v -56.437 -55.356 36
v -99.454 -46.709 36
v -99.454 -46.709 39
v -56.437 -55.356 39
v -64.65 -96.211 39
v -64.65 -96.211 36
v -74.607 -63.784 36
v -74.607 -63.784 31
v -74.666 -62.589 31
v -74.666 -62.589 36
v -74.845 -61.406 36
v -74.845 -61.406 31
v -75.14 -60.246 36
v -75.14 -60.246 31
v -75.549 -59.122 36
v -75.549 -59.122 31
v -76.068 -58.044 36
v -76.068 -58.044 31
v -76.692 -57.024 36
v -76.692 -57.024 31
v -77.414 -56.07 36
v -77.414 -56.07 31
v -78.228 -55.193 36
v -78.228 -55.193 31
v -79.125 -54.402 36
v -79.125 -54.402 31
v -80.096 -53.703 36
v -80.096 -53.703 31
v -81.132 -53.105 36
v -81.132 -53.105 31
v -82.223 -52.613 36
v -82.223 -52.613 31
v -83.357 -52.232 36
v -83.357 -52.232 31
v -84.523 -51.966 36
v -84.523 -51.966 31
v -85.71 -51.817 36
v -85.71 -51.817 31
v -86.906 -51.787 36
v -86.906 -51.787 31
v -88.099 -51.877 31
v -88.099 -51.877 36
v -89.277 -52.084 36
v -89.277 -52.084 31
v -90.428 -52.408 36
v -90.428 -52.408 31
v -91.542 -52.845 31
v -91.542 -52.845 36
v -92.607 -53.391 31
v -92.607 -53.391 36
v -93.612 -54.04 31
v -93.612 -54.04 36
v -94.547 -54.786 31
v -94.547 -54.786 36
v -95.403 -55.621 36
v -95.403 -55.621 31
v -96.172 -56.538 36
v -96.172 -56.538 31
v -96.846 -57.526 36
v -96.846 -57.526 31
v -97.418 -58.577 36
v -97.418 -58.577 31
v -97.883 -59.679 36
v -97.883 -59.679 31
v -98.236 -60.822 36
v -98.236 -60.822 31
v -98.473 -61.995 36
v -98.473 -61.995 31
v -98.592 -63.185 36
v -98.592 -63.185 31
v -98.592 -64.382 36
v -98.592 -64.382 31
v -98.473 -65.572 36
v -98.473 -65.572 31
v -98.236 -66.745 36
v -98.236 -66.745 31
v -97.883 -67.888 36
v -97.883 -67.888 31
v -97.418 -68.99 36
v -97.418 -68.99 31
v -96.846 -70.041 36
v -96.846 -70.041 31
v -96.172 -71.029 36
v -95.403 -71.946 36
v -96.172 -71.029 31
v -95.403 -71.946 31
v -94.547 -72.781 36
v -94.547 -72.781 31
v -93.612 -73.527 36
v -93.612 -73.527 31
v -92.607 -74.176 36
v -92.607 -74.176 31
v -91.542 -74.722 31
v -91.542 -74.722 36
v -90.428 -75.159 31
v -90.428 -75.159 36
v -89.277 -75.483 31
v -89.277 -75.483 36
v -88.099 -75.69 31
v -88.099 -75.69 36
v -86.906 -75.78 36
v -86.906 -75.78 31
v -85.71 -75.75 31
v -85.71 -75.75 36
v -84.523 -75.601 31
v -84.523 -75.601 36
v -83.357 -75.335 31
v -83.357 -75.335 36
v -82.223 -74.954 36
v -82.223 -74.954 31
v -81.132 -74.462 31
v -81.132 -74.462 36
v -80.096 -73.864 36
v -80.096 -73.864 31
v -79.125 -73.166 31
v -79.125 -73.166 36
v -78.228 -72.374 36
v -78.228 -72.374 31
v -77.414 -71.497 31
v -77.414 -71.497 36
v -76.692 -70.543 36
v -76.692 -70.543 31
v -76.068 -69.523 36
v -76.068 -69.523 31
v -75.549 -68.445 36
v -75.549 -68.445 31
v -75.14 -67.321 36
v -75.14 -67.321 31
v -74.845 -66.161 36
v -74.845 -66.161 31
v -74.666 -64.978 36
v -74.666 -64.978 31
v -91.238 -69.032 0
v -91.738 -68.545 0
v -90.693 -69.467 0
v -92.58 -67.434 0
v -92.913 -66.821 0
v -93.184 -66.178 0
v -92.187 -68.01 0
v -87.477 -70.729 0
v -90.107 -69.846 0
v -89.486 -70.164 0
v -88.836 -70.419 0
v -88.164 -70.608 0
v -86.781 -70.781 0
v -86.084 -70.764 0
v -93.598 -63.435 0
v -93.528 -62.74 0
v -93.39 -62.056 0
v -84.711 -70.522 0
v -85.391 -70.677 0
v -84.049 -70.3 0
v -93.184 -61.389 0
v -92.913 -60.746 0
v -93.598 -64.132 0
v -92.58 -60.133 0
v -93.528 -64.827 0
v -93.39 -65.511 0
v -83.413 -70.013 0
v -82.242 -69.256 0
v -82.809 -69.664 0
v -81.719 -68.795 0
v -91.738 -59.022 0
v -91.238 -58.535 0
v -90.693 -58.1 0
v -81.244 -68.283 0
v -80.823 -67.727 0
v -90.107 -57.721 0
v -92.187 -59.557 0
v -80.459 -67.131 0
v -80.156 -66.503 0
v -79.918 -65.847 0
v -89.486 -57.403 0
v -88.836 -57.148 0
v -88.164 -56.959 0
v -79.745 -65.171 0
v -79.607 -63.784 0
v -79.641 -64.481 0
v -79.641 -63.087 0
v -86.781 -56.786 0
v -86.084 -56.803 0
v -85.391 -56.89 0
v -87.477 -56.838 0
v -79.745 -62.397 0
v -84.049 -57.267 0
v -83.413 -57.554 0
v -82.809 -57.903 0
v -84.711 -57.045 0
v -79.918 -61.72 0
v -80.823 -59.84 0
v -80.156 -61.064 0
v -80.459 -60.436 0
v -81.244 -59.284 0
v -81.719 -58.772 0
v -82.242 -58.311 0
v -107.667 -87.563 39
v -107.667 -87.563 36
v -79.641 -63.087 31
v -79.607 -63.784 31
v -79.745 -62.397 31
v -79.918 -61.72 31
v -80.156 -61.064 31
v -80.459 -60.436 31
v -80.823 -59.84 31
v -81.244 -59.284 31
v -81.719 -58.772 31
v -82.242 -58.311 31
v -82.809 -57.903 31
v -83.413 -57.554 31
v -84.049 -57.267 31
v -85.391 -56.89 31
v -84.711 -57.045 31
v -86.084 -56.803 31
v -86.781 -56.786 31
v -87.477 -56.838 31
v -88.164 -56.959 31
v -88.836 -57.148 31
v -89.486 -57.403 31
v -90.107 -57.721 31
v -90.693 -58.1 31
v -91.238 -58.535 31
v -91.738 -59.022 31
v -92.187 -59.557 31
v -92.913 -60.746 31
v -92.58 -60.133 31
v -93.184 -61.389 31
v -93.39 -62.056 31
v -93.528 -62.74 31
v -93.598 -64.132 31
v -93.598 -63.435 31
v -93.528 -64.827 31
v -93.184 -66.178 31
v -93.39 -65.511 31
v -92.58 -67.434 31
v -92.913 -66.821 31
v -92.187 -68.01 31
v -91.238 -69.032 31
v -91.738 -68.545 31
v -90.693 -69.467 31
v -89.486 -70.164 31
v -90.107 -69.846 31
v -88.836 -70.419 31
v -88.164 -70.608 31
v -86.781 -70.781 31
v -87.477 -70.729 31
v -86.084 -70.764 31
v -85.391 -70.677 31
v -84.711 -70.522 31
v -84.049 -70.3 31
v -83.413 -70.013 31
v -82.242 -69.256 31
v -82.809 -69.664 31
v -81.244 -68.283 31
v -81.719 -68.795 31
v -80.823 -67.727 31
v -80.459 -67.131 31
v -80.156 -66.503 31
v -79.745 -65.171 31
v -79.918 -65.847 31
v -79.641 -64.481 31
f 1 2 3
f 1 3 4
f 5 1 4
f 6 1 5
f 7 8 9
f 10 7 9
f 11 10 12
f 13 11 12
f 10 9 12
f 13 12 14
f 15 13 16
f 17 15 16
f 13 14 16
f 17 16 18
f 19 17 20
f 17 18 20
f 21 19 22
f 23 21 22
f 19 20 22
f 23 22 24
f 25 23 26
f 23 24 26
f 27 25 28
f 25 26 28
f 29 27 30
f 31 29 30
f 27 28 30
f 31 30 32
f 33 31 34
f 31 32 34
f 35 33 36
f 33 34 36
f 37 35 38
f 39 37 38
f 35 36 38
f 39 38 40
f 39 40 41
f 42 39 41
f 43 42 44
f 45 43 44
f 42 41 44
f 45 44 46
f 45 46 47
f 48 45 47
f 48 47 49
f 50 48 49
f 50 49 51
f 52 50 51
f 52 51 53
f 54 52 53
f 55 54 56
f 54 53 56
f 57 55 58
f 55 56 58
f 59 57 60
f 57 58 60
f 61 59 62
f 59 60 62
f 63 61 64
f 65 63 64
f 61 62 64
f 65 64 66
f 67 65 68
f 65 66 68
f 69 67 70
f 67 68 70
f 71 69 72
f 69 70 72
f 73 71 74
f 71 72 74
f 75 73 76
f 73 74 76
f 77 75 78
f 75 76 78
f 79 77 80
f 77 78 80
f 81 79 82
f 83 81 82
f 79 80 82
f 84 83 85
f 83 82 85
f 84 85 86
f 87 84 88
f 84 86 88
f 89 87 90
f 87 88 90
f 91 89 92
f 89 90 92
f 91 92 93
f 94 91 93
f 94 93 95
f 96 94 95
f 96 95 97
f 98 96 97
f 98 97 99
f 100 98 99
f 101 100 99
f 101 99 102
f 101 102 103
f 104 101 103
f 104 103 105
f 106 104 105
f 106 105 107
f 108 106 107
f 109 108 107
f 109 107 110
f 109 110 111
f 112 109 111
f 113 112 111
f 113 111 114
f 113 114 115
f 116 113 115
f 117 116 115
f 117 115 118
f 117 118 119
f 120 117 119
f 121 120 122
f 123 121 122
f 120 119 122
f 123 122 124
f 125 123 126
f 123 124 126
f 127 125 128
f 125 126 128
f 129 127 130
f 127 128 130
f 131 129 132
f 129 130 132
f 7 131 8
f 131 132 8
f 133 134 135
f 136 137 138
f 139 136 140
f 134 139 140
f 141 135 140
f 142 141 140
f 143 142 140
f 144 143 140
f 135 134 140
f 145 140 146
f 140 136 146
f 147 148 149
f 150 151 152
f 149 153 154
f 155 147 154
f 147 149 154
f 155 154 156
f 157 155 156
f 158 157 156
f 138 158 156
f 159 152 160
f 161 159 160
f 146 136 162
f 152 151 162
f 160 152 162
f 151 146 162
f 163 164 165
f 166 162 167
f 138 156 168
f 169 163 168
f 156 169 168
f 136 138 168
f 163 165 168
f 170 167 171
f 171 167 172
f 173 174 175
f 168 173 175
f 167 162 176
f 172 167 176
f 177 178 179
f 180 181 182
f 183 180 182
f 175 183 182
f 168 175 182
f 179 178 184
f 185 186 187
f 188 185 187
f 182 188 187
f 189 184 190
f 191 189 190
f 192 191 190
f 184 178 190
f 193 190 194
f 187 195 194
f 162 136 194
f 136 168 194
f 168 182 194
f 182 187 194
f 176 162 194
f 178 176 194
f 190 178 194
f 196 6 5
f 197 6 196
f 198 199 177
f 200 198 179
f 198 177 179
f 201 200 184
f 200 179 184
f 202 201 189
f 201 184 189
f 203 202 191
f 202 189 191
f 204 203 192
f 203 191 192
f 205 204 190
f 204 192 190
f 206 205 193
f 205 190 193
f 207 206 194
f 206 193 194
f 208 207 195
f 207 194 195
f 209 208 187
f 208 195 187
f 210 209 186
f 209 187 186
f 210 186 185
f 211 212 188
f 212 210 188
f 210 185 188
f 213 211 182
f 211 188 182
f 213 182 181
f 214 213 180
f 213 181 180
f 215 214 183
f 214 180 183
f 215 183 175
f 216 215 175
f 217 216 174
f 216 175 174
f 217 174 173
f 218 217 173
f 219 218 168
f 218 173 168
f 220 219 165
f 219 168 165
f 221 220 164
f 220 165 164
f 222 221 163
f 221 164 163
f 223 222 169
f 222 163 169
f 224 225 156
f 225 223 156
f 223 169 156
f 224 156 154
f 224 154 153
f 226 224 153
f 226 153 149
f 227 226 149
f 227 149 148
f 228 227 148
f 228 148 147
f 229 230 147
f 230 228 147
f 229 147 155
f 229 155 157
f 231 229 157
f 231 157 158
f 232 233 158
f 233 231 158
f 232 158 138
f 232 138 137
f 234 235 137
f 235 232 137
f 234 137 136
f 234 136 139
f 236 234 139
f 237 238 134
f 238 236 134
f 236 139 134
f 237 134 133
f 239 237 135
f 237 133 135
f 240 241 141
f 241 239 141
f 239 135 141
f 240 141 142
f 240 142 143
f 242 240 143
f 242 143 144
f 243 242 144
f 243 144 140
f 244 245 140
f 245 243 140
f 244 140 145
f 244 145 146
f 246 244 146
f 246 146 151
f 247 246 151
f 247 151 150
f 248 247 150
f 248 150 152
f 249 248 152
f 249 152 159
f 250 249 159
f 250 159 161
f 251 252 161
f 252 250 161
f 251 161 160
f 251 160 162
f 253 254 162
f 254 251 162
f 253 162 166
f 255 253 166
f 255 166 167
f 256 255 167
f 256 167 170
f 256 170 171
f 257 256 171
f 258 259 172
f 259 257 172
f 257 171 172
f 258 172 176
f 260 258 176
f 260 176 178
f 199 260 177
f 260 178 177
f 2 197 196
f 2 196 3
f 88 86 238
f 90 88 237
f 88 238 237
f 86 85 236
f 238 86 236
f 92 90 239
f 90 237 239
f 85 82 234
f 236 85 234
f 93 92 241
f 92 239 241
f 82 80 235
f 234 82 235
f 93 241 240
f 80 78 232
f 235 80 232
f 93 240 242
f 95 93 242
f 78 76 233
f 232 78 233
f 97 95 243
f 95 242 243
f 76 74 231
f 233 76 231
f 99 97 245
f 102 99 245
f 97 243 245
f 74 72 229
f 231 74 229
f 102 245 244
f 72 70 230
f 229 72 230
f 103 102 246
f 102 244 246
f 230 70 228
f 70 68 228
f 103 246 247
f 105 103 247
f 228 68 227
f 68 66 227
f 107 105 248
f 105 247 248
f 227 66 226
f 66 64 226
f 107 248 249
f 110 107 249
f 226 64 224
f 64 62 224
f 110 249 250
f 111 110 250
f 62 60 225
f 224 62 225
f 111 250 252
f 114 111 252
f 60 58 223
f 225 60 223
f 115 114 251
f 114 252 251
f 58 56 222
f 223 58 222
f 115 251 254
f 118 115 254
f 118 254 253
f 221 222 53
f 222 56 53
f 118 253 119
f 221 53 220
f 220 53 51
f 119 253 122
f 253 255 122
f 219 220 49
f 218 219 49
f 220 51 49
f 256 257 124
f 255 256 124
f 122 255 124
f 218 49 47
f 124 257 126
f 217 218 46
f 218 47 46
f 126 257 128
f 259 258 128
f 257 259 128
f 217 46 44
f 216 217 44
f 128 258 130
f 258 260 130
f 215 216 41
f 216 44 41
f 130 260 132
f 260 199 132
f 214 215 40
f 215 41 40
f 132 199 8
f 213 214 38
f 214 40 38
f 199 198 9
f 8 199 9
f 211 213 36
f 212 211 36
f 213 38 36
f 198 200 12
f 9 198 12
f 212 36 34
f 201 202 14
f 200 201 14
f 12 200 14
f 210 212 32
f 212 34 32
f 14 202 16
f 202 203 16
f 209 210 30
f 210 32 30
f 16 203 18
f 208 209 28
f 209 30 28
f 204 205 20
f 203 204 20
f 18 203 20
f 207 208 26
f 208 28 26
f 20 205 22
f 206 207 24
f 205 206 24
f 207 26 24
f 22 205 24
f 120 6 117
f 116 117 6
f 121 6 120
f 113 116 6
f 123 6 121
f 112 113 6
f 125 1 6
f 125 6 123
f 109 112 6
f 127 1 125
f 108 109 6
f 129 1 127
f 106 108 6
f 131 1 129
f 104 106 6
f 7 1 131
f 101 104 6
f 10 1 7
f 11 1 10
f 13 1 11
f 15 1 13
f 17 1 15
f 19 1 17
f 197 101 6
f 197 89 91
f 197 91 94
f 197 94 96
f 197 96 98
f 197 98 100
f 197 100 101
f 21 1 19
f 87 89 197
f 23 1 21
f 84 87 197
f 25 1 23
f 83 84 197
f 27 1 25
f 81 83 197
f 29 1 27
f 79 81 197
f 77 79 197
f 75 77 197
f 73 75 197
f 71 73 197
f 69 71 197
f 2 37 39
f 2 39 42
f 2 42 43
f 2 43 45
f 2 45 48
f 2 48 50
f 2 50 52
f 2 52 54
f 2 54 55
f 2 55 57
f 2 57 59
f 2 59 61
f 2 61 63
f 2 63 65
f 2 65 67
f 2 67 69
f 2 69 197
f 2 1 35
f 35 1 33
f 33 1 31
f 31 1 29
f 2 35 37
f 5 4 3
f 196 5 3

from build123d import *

# Parameters (mm, degrees)
SKETCH_1_R           = 7
EXTRUDE_1_DEPTH      = 34
EXTRUDE_2_DEPTH      = 2
EXTRUDE_2_DEPTH_BACK = 3
SKETCH_2_R           = 12
EXTRUDE_4_DEPTH      = 3


with BuildPart() as part:
    # 草图1 → 凸台-拉伸1 (new body)
    with BuildSketch(Plane.XY):
        with Locations((-86.606649797, -63.783530386)):
            Circle(SKETCH_1_R)
    extrude(amount=EXTRUDE_1_DEPTH)

    # 草图2 → 凸台-拉伸2 (add, two sides: drawn at the far end of the back side and taken through both)
    with BuildSketch(Plane.XY.offset(34).offset(-EXTRUDE_2_DEPTH_BACK)):
        with Locations((-86.606649797, -63.783530386)):
            Circle(SKETCH_2_R)
    extrude(amount=EXTRUDE_2_DEPTH + EXTRUDE_2_DEPTH_BACK)

    # 草图3 → 凸台-拉伸4 (add)
    with BuildSketch(Plane.XY.offset(36)):
        Polygon((-99.453609906, -46.708587879), (-56.43686088, -55.3563008), (-64.649842886, -96.21054618), (-107.666591911, -87.562833258), align=None)
    extrude(amount=EXTRUDE_4_DEPTH)


solid = part.part
